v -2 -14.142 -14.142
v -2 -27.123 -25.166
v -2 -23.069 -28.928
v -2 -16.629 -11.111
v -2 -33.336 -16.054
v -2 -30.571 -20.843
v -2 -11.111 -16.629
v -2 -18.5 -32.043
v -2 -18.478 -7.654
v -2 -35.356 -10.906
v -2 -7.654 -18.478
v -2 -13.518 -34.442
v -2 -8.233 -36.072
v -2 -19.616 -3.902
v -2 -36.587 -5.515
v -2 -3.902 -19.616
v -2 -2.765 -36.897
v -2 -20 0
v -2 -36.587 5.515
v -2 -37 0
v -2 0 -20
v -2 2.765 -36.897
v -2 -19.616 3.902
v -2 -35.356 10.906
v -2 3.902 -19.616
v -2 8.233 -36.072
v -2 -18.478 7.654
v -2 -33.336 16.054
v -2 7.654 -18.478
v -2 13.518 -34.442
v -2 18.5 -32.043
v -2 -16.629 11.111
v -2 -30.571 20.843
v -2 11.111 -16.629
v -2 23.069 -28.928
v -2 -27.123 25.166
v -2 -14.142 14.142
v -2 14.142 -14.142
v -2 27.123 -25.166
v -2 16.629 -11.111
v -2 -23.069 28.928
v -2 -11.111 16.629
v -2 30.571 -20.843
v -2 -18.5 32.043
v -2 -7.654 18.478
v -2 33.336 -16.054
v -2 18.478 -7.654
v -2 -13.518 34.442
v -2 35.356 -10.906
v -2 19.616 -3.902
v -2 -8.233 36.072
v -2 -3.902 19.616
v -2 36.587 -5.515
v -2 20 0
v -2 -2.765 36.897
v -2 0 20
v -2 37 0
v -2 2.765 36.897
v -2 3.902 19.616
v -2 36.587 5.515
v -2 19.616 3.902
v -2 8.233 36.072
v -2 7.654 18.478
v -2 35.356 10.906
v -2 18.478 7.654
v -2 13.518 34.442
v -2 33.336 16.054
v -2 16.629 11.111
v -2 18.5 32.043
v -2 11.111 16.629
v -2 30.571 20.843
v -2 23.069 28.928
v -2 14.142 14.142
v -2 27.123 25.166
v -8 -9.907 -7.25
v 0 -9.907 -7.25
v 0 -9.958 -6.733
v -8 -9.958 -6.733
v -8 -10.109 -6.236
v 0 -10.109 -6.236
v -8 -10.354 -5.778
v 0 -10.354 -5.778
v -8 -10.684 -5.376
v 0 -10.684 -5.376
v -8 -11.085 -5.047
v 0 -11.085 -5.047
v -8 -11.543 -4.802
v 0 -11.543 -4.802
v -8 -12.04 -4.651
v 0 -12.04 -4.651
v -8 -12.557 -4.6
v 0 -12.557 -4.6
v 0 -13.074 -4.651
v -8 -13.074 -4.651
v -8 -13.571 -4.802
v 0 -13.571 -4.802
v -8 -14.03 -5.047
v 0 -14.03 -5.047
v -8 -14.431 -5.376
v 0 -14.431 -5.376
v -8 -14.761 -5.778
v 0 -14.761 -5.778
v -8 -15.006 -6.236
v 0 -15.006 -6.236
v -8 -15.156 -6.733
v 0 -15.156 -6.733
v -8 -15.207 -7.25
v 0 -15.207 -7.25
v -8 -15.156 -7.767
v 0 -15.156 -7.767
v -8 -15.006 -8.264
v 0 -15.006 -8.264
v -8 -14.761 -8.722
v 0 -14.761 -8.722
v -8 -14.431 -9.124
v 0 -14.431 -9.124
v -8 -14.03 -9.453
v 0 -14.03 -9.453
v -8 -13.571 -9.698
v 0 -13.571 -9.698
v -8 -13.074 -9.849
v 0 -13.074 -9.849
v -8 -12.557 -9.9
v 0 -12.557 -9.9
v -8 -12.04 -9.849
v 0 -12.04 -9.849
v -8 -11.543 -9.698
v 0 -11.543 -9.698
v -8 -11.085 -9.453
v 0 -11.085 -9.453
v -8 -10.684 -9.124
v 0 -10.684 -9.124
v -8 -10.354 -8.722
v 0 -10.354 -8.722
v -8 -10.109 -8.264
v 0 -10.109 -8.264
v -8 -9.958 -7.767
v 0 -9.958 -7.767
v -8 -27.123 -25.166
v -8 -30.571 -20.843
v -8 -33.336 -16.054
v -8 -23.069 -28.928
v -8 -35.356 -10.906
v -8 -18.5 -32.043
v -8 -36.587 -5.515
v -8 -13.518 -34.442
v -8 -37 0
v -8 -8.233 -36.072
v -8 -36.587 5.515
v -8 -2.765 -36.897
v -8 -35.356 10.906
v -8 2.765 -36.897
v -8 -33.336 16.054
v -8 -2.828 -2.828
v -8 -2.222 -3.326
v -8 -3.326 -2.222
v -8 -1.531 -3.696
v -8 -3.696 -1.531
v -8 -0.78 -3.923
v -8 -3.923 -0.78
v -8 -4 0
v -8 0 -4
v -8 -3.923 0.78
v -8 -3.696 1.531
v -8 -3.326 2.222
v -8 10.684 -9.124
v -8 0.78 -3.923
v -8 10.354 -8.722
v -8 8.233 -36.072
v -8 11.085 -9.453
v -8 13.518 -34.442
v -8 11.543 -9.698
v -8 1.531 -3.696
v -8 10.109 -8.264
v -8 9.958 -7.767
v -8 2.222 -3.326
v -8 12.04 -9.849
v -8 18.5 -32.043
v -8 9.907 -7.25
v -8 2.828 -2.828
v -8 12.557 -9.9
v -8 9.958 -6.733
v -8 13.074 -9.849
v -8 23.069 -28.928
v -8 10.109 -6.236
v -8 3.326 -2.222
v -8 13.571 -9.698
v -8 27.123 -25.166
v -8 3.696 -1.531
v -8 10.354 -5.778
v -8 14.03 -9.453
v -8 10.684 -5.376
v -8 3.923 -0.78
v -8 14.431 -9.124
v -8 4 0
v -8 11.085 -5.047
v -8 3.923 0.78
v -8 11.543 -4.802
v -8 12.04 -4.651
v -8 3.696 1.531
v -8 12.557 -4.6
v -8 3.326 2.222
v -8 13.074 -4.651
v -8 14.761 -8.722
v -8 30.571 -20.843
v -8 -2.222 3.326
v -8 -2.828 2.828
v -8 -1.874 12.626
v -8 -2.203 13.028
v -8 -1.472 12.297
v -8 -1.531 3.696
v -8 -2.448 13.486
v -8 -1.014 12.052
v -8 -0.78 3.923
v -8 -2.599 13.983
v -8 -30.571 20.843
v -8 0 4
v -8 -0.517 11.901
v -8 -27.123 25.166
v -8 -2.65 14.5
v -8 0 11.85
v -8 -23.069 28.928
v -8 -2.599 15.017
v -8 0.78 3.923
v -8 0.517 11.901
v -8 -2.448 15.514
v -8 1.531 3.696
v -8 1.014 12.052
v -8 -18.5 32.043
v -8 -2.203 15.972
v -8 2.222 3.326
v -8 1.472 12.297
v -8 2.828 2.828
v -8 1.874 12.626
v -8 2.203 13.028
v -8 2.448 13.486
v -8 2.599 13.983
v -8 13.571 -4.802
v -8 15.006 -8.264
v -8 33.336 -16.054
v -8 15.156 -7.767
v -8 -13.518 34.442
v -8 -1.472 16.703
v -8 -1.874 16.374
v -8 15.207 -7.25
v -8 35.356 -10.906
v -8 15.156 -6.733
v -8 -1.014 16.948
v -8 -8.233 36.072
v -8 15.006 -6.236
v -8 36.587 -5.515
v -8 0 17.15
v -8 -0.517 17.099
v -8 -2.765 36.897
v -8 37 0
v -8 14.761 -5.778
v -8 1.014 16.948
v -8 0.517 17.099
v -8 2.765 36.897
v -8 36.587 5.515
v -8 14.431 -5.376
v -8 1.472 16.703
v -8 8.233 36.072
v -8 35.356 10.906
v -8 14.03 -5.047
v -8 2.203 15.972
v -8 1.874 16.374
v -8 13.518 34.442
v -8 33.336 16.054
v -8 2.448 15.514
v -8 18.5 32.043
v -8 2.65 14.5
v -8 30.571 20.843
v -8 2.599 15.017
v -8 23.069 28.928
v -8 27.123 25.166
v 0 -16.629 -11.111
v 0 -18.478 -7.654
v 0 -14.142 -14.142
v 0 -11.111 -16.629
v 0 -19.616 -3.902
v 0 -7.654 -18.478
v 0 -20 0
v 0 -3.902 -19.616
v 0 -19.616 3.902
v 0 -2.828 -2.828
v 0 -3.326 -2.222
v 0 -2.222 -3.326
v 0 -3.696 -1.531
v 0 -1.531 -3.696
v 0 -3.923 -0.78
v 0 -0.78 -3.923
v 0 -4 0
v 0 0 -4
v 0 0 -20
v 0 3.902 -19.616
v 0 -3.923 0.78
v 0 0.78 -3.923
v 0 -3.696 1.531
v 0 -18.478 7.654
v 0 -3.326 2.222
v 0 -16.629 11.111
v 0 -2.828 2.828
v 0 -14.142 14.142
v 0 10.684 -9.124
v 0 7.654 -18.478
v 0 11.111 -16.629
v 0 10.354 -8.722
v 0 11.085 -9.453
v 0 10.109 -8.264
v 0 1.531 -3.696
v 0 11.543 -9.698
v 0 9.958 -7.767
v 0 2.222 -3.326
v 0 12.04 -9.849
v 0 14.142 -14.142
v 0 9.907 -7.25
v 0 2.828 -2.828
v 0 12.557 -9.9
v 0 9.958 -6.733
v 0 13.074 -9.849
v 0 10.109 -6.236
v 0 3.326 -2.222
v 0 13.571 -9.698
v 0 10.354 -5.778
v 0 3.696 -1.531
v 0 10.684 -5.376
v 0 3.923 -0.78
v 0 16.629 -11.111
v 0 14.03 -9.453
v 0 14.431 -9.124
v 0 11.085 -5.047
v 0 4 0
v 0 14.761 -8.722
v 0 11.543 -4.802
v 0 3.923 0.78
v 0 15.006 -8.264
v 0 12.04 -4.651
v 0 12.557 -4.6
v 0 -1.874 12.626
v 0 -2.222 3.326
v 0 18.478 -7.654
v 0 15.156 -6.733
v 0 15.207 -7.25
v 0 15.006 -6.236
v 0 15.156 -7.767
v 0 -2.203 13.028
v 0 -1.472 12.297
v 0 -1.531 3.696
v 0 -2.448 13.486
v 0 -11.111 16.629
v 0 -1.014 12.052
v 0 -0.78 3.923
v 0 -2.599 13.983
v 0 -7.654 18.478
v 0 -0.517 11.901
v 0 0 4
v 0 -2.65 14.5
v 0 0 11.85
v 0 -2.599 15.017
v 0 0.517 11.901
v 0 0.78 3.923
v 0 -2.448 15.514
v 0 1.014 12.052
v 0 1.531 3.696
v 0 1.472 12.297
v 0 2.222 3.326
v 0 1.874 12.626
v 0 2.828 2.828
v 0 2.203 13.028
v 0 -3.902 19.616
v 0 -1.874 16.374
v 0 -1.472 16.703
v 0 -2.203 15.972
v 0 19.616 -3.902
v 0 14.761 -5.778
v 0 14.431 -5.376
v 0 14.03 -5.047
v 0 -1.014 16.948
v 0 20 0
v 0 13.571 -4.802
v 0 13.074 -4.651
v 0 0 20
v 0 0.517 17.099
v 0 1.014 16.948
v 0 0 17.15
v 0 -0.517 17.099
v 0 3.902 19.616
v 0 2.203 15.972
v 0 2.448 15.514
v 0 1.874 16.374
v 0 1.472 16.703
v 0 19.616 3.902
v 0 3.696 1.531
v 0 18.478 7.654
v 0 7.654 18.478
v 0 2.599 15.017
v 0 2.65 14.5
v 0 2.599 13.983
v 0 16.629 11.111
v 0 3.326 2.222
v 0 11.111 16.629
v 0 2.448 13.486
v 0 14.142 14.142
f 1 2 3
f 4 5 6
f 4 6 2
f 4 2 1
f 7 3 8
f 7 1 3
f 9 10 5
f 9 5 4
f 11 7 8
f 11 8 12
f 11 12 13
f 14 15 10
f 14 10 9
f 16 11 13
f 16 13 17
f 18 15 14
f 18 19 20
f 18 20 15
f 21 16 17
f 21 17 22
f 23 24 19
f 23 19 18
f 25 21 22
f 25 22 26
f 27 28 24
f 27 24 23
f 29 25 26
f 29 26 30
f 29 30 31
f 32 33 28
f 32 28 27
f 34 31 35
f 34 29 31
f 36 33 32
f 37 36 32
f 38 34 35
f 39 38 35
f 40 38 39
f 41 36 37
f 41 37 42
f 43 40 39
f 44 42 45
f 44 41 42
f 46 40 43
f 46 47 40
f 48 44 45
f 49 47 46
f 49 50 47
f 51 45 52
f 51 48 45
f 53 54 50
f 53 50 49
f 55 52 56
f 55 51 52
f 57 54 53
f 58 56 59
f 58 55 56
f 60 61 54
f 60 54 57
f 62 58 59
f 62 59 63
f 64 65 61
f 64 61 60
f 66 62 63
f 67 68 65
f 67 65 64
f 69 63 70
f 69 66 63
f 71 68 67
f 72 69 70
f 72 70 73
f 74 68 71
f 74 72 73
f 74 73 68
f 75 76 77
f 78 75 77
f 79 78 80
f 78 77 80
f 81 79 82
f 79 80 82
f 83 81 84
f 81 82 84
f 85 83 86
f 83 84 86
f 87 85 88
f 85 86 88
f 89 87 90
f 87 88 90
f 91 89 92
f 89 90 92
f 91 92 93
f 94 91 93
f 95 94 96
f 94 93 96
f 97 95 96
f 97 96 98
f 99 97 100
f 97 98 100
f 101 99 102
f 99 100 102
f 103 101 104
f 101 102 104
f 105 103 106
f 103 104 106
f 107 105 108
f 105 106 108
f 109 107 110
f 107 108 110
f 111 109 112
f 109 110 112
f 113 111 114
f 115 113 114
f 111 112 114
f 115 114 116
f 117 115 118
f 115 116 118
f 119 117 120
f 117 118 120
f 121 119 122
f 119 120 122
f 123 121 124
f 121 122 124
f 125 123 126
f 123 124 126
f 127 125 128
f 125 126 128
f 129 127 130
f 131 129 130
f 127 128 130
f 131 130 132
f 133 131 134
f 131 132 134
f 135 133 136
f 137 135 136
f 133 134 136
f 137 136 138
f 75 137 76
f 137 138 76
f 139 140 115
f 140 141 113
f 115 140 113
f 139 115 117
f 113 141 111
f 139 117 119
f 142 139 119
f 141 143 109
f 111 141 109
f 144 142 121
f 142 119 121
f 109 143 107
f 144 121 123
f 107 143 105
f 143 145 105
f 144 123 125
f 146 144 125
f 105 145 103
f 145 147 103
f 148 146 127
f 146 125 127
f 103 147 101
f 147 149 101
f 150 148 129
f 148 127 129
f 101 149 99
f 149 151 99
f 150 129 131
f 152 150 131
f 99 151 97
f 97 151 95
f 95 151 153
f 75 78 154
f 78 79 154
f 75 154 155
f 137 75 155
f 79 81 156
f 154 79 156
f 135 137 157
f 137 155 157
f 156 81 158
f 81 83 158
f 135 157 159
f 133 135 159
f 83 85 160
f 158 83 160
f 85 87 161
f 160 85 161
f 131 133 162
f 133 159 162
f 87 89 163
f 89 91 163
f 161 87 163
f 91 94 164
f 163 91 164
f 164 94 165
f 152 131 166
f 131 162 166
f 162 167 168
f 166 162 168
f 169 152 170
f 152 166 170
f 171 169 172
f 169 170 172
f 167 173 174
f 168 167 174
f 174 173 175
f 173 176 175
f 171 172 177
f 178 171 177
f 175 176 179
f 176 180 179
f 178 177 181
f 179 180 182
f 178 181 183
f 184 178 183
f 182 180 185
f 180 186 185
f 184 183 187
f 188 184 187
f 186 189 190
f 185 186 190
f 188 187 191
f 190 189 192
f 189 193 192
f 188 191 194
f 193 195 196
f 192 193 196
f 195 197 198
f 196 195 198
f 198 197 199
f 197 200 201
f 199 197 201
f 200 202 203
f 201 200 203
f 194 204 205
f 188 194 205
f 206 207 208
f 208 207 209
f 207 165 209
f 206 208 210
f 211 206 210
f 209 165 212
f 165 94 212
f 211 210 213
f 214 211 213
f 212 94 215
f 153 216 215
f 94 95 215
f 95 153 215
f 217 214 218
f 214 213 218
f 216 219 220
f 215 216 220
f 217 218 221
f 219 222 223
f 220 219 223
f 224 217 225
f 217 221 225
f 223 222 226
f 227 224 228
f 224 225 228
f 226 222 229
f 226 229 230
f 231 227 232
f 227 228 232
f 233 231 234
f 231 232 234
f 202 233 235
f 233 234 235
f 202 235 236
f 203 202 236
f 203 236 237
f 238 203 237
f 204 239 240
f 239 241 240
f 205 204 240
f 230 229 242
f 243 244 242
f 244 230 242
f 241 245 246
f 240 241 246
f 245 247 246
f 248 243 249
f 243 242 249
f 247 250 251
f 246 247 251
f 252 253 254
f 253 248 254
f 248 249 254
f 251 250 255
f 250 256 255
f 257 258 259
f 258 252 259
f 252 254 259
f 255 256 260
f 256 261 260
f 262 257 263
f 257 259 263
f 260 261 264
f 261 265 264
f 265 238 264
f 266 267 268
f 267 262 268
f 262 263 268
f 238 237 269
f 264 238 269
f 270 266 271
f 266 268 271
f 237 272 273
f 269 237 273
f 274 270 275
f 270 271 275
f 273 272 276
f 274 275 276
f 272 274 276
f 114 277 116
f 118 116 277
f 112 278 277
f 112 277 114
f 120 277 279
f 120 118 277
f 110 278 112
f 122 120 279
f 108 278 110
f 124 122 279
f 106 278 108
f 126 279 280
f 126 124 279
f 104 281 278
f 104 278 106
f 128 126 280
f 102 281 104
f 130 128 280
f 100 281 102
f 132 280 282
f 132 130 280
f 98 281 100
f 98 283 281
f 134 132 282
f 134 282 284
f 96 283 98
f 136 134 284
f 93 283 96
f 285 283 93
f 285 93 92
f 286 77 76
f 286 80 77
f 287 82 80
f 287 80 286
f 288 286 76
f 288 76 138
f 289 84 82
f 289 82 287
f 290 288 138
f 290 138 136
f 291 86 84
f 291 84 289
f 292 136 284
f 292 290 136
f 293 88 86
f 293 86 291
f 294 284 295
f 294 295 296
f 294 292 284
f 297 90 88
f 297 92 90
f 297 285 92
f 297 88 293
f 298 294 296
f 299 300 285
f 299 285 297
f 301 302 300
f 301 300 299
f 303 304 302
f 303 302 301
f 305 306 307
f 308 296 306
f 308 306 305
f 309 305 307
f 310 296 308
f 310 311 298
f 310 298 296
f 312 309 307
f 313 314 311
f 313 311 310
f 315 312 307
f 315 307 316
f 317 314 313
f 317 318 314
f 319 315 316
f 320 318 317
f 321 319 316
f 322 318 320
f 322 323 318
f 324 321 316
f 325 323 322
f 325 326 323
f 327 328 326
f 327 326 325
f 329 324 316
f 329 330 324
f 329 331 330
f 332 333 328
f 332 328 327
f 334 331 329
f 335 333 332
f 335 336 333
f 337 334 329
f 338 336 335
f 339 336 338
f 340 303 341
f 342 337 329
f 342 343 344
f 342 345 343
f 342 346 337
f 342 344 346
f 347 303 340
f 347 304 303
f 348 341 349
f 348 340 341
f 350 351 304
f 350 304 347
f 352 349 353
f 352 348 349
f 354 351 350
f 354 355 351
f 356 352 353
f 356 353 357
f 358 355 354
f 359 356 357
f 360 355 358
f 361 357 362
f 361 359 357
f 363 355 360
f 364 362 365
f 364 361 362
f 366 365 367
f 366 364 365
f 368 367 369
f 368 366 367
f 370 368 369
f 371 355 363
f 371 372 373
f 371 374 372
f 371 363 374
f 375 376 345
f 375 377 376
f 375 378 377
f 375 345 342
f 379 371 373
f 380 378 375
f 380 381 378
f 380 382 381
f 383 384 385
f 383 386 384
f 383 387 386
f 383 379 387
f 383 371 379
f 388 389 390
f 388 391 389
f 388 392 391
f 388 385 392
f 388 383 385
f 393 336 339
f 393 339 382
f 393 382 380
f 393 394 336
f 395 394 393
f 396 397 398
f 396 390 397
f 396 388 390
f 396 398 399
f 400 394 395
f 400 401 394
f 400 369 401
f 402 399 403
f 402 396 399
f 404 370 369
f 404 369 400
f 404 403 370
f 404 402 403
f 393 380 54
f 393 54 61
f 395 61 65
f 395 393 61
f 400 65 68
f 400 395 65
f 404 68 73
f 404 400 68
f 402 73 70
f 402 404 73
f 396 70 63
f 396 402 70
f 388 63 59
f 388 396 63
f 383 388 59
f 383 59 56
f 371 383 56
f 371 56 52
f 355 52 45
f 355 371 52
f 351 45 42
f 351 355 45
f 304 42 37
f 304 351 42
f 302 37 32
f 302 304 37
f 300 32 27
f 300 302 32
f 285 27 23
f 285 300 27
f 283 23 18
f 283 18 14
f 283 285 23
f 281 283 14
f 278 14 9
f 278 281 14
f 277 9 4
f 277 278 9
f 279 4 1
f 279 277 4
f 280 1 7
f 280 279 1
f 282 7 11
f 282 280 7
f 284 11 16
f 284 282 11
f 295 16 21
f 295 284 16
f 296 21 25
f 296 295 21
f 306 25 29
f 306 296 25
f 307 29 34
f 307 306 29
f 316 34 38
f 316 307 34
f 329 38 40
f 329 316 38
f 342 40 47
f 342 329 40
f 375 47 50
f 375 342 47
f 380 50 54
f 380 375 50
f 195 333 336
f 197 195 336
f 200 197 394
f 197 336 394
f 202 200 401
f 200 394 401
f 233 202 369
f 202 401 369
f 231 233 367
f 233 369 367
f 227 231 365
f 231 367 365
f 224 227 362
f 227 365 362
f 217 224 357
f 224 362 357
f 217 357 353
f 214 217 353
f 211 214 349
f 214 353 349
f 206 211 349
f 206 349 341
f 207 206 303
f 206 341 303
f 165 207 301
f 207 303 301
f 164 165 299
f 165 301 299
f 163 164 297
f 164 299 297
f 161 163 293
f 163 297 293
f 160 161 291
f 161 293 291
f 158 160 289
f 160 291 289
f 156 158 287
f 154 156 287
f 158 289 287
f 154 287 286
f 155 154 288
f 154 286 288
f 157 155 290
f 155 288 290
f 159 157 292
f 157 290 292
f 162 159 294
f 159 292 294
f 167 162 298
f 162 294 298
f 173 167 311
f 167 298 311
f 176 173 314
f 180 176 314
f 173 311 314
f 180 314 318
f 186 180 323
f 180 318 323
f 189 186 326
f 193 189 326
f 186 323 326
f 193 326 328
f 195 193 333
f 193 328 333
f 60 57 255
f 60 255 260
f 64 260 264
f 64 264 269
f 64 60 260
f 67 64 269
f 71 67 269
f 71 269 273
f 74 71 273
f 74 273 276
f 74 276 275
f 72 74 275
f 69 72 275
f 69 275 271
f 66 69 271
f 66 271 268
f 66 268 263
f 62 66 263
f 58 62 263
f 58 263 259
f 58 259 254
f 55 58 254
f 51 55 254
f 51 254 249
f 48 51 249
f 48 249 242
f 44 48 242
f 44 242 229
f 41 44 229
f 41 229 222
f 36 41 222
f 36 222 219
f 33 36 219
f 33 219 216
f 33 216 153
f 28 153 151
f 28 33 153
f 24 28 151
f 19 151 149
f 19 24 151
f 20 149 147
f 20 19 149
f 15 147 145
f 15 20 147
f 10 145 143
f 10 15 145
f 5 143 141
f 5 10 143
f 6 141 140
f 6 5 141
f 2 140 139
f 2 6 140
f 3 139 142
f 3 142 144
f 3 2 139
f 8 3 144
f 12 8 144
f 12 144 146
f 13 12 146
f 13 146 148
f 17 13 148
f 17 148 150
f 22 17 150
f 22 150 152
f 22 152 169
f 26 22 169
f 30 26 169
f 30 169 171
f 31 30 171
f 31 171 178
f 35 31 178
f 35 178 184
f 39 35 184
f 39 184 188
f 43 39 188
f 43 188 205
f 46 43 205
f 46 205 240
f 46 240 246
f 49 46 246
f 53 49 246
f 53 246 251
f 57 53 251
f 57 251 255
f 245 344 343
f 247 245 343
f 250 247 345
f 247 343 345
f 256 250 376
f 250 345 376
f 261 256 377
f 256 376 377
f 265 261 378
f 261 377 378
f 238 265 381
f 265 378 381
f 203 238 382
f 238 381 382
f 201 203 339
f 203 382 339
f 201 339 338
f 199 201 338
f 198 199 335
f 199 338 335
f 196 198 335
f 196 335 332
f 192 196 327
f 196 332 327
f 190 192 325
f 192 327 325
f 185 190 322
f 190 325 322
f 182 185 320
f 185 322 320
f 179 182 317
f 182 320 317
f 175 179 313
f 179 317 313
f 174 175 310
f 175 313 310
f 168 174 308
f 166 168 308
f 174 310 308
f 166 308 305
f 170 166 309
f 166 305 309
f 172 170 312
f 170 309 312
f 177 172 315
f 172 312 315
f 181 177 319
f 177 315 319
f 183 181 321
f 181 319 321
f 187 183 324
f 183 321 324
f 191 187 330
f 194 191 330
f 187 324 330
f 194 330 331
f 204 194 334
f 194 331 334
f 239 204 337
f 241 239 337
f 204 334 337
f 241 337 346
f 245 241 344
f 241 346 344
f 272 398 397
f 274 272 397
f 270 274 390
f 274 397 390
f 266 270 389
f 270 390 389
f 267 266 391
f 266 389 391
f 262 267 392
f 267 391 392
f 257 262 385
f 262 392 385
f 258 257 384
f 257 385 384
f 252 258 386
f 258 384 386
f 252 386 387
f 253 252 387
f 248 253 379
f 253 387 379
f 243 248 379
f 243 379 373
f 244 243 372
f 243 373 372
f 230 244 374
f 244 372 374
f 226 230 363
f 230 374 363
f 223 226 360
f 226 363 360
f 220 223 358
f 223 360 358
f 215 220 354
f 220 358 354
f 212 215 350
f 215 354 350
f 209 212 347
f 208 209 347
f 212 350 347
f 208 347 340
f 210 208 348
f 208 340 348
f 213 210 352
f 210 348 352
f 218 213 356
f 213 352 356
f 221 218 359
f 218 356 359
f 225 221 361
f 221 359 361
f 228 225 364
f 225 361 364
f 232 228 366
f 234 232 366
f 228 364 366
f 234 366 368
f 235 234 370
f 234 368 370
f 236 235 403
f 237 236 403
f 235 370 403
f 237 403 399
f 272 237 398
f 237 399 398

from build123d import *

# Parameters (mm, degrees)
F0_R     = 37
F0_R_2   = 20
F0_R_3   = 2.65
F0_R_4   = 4
F1_DEPTH = 8
F2_DEPTH = 2


# Not quite as in the source:
# - a feature names something its author has since deleted; it is built from what else it names


with BuildPart() as f1:
    # F0 (on Right) → F1 (new body)
    with BuildSketch(Plane.YZ):
        Circle(F0_R)
        Circle(F0_R_2, mode=Mode.SUBTRACT)
        Circle(F0_R_2)
        with Locations((-12.5573683549, -7.25)):
            Circle(F0_R_3, mode=Mode.SUBTRACT)
        with Locations((12.5573683549, -7.25)):
            Circle(F0_R_3, mode=Mode.SUBTRACT)
        Circle(F0_R_4, mode=Mode.SUBTRACT)
        with Locations((0, 14.5)):
            Circle(F0_R_3, mode=Mode.SUBTRACT)
    extrude(amount=-F1_DEPTH)

    # F0 (on Right) → F2 (cut)
    with BuildSketch(Plane.YZ):
        Circle(F0_R)
        Circle(F0_R_2, mode=Mode.SUBTRACT)
    extrude(amount=-F2_DEPTH, mode=Mode.SUBTRACT)


solid = f1.part
